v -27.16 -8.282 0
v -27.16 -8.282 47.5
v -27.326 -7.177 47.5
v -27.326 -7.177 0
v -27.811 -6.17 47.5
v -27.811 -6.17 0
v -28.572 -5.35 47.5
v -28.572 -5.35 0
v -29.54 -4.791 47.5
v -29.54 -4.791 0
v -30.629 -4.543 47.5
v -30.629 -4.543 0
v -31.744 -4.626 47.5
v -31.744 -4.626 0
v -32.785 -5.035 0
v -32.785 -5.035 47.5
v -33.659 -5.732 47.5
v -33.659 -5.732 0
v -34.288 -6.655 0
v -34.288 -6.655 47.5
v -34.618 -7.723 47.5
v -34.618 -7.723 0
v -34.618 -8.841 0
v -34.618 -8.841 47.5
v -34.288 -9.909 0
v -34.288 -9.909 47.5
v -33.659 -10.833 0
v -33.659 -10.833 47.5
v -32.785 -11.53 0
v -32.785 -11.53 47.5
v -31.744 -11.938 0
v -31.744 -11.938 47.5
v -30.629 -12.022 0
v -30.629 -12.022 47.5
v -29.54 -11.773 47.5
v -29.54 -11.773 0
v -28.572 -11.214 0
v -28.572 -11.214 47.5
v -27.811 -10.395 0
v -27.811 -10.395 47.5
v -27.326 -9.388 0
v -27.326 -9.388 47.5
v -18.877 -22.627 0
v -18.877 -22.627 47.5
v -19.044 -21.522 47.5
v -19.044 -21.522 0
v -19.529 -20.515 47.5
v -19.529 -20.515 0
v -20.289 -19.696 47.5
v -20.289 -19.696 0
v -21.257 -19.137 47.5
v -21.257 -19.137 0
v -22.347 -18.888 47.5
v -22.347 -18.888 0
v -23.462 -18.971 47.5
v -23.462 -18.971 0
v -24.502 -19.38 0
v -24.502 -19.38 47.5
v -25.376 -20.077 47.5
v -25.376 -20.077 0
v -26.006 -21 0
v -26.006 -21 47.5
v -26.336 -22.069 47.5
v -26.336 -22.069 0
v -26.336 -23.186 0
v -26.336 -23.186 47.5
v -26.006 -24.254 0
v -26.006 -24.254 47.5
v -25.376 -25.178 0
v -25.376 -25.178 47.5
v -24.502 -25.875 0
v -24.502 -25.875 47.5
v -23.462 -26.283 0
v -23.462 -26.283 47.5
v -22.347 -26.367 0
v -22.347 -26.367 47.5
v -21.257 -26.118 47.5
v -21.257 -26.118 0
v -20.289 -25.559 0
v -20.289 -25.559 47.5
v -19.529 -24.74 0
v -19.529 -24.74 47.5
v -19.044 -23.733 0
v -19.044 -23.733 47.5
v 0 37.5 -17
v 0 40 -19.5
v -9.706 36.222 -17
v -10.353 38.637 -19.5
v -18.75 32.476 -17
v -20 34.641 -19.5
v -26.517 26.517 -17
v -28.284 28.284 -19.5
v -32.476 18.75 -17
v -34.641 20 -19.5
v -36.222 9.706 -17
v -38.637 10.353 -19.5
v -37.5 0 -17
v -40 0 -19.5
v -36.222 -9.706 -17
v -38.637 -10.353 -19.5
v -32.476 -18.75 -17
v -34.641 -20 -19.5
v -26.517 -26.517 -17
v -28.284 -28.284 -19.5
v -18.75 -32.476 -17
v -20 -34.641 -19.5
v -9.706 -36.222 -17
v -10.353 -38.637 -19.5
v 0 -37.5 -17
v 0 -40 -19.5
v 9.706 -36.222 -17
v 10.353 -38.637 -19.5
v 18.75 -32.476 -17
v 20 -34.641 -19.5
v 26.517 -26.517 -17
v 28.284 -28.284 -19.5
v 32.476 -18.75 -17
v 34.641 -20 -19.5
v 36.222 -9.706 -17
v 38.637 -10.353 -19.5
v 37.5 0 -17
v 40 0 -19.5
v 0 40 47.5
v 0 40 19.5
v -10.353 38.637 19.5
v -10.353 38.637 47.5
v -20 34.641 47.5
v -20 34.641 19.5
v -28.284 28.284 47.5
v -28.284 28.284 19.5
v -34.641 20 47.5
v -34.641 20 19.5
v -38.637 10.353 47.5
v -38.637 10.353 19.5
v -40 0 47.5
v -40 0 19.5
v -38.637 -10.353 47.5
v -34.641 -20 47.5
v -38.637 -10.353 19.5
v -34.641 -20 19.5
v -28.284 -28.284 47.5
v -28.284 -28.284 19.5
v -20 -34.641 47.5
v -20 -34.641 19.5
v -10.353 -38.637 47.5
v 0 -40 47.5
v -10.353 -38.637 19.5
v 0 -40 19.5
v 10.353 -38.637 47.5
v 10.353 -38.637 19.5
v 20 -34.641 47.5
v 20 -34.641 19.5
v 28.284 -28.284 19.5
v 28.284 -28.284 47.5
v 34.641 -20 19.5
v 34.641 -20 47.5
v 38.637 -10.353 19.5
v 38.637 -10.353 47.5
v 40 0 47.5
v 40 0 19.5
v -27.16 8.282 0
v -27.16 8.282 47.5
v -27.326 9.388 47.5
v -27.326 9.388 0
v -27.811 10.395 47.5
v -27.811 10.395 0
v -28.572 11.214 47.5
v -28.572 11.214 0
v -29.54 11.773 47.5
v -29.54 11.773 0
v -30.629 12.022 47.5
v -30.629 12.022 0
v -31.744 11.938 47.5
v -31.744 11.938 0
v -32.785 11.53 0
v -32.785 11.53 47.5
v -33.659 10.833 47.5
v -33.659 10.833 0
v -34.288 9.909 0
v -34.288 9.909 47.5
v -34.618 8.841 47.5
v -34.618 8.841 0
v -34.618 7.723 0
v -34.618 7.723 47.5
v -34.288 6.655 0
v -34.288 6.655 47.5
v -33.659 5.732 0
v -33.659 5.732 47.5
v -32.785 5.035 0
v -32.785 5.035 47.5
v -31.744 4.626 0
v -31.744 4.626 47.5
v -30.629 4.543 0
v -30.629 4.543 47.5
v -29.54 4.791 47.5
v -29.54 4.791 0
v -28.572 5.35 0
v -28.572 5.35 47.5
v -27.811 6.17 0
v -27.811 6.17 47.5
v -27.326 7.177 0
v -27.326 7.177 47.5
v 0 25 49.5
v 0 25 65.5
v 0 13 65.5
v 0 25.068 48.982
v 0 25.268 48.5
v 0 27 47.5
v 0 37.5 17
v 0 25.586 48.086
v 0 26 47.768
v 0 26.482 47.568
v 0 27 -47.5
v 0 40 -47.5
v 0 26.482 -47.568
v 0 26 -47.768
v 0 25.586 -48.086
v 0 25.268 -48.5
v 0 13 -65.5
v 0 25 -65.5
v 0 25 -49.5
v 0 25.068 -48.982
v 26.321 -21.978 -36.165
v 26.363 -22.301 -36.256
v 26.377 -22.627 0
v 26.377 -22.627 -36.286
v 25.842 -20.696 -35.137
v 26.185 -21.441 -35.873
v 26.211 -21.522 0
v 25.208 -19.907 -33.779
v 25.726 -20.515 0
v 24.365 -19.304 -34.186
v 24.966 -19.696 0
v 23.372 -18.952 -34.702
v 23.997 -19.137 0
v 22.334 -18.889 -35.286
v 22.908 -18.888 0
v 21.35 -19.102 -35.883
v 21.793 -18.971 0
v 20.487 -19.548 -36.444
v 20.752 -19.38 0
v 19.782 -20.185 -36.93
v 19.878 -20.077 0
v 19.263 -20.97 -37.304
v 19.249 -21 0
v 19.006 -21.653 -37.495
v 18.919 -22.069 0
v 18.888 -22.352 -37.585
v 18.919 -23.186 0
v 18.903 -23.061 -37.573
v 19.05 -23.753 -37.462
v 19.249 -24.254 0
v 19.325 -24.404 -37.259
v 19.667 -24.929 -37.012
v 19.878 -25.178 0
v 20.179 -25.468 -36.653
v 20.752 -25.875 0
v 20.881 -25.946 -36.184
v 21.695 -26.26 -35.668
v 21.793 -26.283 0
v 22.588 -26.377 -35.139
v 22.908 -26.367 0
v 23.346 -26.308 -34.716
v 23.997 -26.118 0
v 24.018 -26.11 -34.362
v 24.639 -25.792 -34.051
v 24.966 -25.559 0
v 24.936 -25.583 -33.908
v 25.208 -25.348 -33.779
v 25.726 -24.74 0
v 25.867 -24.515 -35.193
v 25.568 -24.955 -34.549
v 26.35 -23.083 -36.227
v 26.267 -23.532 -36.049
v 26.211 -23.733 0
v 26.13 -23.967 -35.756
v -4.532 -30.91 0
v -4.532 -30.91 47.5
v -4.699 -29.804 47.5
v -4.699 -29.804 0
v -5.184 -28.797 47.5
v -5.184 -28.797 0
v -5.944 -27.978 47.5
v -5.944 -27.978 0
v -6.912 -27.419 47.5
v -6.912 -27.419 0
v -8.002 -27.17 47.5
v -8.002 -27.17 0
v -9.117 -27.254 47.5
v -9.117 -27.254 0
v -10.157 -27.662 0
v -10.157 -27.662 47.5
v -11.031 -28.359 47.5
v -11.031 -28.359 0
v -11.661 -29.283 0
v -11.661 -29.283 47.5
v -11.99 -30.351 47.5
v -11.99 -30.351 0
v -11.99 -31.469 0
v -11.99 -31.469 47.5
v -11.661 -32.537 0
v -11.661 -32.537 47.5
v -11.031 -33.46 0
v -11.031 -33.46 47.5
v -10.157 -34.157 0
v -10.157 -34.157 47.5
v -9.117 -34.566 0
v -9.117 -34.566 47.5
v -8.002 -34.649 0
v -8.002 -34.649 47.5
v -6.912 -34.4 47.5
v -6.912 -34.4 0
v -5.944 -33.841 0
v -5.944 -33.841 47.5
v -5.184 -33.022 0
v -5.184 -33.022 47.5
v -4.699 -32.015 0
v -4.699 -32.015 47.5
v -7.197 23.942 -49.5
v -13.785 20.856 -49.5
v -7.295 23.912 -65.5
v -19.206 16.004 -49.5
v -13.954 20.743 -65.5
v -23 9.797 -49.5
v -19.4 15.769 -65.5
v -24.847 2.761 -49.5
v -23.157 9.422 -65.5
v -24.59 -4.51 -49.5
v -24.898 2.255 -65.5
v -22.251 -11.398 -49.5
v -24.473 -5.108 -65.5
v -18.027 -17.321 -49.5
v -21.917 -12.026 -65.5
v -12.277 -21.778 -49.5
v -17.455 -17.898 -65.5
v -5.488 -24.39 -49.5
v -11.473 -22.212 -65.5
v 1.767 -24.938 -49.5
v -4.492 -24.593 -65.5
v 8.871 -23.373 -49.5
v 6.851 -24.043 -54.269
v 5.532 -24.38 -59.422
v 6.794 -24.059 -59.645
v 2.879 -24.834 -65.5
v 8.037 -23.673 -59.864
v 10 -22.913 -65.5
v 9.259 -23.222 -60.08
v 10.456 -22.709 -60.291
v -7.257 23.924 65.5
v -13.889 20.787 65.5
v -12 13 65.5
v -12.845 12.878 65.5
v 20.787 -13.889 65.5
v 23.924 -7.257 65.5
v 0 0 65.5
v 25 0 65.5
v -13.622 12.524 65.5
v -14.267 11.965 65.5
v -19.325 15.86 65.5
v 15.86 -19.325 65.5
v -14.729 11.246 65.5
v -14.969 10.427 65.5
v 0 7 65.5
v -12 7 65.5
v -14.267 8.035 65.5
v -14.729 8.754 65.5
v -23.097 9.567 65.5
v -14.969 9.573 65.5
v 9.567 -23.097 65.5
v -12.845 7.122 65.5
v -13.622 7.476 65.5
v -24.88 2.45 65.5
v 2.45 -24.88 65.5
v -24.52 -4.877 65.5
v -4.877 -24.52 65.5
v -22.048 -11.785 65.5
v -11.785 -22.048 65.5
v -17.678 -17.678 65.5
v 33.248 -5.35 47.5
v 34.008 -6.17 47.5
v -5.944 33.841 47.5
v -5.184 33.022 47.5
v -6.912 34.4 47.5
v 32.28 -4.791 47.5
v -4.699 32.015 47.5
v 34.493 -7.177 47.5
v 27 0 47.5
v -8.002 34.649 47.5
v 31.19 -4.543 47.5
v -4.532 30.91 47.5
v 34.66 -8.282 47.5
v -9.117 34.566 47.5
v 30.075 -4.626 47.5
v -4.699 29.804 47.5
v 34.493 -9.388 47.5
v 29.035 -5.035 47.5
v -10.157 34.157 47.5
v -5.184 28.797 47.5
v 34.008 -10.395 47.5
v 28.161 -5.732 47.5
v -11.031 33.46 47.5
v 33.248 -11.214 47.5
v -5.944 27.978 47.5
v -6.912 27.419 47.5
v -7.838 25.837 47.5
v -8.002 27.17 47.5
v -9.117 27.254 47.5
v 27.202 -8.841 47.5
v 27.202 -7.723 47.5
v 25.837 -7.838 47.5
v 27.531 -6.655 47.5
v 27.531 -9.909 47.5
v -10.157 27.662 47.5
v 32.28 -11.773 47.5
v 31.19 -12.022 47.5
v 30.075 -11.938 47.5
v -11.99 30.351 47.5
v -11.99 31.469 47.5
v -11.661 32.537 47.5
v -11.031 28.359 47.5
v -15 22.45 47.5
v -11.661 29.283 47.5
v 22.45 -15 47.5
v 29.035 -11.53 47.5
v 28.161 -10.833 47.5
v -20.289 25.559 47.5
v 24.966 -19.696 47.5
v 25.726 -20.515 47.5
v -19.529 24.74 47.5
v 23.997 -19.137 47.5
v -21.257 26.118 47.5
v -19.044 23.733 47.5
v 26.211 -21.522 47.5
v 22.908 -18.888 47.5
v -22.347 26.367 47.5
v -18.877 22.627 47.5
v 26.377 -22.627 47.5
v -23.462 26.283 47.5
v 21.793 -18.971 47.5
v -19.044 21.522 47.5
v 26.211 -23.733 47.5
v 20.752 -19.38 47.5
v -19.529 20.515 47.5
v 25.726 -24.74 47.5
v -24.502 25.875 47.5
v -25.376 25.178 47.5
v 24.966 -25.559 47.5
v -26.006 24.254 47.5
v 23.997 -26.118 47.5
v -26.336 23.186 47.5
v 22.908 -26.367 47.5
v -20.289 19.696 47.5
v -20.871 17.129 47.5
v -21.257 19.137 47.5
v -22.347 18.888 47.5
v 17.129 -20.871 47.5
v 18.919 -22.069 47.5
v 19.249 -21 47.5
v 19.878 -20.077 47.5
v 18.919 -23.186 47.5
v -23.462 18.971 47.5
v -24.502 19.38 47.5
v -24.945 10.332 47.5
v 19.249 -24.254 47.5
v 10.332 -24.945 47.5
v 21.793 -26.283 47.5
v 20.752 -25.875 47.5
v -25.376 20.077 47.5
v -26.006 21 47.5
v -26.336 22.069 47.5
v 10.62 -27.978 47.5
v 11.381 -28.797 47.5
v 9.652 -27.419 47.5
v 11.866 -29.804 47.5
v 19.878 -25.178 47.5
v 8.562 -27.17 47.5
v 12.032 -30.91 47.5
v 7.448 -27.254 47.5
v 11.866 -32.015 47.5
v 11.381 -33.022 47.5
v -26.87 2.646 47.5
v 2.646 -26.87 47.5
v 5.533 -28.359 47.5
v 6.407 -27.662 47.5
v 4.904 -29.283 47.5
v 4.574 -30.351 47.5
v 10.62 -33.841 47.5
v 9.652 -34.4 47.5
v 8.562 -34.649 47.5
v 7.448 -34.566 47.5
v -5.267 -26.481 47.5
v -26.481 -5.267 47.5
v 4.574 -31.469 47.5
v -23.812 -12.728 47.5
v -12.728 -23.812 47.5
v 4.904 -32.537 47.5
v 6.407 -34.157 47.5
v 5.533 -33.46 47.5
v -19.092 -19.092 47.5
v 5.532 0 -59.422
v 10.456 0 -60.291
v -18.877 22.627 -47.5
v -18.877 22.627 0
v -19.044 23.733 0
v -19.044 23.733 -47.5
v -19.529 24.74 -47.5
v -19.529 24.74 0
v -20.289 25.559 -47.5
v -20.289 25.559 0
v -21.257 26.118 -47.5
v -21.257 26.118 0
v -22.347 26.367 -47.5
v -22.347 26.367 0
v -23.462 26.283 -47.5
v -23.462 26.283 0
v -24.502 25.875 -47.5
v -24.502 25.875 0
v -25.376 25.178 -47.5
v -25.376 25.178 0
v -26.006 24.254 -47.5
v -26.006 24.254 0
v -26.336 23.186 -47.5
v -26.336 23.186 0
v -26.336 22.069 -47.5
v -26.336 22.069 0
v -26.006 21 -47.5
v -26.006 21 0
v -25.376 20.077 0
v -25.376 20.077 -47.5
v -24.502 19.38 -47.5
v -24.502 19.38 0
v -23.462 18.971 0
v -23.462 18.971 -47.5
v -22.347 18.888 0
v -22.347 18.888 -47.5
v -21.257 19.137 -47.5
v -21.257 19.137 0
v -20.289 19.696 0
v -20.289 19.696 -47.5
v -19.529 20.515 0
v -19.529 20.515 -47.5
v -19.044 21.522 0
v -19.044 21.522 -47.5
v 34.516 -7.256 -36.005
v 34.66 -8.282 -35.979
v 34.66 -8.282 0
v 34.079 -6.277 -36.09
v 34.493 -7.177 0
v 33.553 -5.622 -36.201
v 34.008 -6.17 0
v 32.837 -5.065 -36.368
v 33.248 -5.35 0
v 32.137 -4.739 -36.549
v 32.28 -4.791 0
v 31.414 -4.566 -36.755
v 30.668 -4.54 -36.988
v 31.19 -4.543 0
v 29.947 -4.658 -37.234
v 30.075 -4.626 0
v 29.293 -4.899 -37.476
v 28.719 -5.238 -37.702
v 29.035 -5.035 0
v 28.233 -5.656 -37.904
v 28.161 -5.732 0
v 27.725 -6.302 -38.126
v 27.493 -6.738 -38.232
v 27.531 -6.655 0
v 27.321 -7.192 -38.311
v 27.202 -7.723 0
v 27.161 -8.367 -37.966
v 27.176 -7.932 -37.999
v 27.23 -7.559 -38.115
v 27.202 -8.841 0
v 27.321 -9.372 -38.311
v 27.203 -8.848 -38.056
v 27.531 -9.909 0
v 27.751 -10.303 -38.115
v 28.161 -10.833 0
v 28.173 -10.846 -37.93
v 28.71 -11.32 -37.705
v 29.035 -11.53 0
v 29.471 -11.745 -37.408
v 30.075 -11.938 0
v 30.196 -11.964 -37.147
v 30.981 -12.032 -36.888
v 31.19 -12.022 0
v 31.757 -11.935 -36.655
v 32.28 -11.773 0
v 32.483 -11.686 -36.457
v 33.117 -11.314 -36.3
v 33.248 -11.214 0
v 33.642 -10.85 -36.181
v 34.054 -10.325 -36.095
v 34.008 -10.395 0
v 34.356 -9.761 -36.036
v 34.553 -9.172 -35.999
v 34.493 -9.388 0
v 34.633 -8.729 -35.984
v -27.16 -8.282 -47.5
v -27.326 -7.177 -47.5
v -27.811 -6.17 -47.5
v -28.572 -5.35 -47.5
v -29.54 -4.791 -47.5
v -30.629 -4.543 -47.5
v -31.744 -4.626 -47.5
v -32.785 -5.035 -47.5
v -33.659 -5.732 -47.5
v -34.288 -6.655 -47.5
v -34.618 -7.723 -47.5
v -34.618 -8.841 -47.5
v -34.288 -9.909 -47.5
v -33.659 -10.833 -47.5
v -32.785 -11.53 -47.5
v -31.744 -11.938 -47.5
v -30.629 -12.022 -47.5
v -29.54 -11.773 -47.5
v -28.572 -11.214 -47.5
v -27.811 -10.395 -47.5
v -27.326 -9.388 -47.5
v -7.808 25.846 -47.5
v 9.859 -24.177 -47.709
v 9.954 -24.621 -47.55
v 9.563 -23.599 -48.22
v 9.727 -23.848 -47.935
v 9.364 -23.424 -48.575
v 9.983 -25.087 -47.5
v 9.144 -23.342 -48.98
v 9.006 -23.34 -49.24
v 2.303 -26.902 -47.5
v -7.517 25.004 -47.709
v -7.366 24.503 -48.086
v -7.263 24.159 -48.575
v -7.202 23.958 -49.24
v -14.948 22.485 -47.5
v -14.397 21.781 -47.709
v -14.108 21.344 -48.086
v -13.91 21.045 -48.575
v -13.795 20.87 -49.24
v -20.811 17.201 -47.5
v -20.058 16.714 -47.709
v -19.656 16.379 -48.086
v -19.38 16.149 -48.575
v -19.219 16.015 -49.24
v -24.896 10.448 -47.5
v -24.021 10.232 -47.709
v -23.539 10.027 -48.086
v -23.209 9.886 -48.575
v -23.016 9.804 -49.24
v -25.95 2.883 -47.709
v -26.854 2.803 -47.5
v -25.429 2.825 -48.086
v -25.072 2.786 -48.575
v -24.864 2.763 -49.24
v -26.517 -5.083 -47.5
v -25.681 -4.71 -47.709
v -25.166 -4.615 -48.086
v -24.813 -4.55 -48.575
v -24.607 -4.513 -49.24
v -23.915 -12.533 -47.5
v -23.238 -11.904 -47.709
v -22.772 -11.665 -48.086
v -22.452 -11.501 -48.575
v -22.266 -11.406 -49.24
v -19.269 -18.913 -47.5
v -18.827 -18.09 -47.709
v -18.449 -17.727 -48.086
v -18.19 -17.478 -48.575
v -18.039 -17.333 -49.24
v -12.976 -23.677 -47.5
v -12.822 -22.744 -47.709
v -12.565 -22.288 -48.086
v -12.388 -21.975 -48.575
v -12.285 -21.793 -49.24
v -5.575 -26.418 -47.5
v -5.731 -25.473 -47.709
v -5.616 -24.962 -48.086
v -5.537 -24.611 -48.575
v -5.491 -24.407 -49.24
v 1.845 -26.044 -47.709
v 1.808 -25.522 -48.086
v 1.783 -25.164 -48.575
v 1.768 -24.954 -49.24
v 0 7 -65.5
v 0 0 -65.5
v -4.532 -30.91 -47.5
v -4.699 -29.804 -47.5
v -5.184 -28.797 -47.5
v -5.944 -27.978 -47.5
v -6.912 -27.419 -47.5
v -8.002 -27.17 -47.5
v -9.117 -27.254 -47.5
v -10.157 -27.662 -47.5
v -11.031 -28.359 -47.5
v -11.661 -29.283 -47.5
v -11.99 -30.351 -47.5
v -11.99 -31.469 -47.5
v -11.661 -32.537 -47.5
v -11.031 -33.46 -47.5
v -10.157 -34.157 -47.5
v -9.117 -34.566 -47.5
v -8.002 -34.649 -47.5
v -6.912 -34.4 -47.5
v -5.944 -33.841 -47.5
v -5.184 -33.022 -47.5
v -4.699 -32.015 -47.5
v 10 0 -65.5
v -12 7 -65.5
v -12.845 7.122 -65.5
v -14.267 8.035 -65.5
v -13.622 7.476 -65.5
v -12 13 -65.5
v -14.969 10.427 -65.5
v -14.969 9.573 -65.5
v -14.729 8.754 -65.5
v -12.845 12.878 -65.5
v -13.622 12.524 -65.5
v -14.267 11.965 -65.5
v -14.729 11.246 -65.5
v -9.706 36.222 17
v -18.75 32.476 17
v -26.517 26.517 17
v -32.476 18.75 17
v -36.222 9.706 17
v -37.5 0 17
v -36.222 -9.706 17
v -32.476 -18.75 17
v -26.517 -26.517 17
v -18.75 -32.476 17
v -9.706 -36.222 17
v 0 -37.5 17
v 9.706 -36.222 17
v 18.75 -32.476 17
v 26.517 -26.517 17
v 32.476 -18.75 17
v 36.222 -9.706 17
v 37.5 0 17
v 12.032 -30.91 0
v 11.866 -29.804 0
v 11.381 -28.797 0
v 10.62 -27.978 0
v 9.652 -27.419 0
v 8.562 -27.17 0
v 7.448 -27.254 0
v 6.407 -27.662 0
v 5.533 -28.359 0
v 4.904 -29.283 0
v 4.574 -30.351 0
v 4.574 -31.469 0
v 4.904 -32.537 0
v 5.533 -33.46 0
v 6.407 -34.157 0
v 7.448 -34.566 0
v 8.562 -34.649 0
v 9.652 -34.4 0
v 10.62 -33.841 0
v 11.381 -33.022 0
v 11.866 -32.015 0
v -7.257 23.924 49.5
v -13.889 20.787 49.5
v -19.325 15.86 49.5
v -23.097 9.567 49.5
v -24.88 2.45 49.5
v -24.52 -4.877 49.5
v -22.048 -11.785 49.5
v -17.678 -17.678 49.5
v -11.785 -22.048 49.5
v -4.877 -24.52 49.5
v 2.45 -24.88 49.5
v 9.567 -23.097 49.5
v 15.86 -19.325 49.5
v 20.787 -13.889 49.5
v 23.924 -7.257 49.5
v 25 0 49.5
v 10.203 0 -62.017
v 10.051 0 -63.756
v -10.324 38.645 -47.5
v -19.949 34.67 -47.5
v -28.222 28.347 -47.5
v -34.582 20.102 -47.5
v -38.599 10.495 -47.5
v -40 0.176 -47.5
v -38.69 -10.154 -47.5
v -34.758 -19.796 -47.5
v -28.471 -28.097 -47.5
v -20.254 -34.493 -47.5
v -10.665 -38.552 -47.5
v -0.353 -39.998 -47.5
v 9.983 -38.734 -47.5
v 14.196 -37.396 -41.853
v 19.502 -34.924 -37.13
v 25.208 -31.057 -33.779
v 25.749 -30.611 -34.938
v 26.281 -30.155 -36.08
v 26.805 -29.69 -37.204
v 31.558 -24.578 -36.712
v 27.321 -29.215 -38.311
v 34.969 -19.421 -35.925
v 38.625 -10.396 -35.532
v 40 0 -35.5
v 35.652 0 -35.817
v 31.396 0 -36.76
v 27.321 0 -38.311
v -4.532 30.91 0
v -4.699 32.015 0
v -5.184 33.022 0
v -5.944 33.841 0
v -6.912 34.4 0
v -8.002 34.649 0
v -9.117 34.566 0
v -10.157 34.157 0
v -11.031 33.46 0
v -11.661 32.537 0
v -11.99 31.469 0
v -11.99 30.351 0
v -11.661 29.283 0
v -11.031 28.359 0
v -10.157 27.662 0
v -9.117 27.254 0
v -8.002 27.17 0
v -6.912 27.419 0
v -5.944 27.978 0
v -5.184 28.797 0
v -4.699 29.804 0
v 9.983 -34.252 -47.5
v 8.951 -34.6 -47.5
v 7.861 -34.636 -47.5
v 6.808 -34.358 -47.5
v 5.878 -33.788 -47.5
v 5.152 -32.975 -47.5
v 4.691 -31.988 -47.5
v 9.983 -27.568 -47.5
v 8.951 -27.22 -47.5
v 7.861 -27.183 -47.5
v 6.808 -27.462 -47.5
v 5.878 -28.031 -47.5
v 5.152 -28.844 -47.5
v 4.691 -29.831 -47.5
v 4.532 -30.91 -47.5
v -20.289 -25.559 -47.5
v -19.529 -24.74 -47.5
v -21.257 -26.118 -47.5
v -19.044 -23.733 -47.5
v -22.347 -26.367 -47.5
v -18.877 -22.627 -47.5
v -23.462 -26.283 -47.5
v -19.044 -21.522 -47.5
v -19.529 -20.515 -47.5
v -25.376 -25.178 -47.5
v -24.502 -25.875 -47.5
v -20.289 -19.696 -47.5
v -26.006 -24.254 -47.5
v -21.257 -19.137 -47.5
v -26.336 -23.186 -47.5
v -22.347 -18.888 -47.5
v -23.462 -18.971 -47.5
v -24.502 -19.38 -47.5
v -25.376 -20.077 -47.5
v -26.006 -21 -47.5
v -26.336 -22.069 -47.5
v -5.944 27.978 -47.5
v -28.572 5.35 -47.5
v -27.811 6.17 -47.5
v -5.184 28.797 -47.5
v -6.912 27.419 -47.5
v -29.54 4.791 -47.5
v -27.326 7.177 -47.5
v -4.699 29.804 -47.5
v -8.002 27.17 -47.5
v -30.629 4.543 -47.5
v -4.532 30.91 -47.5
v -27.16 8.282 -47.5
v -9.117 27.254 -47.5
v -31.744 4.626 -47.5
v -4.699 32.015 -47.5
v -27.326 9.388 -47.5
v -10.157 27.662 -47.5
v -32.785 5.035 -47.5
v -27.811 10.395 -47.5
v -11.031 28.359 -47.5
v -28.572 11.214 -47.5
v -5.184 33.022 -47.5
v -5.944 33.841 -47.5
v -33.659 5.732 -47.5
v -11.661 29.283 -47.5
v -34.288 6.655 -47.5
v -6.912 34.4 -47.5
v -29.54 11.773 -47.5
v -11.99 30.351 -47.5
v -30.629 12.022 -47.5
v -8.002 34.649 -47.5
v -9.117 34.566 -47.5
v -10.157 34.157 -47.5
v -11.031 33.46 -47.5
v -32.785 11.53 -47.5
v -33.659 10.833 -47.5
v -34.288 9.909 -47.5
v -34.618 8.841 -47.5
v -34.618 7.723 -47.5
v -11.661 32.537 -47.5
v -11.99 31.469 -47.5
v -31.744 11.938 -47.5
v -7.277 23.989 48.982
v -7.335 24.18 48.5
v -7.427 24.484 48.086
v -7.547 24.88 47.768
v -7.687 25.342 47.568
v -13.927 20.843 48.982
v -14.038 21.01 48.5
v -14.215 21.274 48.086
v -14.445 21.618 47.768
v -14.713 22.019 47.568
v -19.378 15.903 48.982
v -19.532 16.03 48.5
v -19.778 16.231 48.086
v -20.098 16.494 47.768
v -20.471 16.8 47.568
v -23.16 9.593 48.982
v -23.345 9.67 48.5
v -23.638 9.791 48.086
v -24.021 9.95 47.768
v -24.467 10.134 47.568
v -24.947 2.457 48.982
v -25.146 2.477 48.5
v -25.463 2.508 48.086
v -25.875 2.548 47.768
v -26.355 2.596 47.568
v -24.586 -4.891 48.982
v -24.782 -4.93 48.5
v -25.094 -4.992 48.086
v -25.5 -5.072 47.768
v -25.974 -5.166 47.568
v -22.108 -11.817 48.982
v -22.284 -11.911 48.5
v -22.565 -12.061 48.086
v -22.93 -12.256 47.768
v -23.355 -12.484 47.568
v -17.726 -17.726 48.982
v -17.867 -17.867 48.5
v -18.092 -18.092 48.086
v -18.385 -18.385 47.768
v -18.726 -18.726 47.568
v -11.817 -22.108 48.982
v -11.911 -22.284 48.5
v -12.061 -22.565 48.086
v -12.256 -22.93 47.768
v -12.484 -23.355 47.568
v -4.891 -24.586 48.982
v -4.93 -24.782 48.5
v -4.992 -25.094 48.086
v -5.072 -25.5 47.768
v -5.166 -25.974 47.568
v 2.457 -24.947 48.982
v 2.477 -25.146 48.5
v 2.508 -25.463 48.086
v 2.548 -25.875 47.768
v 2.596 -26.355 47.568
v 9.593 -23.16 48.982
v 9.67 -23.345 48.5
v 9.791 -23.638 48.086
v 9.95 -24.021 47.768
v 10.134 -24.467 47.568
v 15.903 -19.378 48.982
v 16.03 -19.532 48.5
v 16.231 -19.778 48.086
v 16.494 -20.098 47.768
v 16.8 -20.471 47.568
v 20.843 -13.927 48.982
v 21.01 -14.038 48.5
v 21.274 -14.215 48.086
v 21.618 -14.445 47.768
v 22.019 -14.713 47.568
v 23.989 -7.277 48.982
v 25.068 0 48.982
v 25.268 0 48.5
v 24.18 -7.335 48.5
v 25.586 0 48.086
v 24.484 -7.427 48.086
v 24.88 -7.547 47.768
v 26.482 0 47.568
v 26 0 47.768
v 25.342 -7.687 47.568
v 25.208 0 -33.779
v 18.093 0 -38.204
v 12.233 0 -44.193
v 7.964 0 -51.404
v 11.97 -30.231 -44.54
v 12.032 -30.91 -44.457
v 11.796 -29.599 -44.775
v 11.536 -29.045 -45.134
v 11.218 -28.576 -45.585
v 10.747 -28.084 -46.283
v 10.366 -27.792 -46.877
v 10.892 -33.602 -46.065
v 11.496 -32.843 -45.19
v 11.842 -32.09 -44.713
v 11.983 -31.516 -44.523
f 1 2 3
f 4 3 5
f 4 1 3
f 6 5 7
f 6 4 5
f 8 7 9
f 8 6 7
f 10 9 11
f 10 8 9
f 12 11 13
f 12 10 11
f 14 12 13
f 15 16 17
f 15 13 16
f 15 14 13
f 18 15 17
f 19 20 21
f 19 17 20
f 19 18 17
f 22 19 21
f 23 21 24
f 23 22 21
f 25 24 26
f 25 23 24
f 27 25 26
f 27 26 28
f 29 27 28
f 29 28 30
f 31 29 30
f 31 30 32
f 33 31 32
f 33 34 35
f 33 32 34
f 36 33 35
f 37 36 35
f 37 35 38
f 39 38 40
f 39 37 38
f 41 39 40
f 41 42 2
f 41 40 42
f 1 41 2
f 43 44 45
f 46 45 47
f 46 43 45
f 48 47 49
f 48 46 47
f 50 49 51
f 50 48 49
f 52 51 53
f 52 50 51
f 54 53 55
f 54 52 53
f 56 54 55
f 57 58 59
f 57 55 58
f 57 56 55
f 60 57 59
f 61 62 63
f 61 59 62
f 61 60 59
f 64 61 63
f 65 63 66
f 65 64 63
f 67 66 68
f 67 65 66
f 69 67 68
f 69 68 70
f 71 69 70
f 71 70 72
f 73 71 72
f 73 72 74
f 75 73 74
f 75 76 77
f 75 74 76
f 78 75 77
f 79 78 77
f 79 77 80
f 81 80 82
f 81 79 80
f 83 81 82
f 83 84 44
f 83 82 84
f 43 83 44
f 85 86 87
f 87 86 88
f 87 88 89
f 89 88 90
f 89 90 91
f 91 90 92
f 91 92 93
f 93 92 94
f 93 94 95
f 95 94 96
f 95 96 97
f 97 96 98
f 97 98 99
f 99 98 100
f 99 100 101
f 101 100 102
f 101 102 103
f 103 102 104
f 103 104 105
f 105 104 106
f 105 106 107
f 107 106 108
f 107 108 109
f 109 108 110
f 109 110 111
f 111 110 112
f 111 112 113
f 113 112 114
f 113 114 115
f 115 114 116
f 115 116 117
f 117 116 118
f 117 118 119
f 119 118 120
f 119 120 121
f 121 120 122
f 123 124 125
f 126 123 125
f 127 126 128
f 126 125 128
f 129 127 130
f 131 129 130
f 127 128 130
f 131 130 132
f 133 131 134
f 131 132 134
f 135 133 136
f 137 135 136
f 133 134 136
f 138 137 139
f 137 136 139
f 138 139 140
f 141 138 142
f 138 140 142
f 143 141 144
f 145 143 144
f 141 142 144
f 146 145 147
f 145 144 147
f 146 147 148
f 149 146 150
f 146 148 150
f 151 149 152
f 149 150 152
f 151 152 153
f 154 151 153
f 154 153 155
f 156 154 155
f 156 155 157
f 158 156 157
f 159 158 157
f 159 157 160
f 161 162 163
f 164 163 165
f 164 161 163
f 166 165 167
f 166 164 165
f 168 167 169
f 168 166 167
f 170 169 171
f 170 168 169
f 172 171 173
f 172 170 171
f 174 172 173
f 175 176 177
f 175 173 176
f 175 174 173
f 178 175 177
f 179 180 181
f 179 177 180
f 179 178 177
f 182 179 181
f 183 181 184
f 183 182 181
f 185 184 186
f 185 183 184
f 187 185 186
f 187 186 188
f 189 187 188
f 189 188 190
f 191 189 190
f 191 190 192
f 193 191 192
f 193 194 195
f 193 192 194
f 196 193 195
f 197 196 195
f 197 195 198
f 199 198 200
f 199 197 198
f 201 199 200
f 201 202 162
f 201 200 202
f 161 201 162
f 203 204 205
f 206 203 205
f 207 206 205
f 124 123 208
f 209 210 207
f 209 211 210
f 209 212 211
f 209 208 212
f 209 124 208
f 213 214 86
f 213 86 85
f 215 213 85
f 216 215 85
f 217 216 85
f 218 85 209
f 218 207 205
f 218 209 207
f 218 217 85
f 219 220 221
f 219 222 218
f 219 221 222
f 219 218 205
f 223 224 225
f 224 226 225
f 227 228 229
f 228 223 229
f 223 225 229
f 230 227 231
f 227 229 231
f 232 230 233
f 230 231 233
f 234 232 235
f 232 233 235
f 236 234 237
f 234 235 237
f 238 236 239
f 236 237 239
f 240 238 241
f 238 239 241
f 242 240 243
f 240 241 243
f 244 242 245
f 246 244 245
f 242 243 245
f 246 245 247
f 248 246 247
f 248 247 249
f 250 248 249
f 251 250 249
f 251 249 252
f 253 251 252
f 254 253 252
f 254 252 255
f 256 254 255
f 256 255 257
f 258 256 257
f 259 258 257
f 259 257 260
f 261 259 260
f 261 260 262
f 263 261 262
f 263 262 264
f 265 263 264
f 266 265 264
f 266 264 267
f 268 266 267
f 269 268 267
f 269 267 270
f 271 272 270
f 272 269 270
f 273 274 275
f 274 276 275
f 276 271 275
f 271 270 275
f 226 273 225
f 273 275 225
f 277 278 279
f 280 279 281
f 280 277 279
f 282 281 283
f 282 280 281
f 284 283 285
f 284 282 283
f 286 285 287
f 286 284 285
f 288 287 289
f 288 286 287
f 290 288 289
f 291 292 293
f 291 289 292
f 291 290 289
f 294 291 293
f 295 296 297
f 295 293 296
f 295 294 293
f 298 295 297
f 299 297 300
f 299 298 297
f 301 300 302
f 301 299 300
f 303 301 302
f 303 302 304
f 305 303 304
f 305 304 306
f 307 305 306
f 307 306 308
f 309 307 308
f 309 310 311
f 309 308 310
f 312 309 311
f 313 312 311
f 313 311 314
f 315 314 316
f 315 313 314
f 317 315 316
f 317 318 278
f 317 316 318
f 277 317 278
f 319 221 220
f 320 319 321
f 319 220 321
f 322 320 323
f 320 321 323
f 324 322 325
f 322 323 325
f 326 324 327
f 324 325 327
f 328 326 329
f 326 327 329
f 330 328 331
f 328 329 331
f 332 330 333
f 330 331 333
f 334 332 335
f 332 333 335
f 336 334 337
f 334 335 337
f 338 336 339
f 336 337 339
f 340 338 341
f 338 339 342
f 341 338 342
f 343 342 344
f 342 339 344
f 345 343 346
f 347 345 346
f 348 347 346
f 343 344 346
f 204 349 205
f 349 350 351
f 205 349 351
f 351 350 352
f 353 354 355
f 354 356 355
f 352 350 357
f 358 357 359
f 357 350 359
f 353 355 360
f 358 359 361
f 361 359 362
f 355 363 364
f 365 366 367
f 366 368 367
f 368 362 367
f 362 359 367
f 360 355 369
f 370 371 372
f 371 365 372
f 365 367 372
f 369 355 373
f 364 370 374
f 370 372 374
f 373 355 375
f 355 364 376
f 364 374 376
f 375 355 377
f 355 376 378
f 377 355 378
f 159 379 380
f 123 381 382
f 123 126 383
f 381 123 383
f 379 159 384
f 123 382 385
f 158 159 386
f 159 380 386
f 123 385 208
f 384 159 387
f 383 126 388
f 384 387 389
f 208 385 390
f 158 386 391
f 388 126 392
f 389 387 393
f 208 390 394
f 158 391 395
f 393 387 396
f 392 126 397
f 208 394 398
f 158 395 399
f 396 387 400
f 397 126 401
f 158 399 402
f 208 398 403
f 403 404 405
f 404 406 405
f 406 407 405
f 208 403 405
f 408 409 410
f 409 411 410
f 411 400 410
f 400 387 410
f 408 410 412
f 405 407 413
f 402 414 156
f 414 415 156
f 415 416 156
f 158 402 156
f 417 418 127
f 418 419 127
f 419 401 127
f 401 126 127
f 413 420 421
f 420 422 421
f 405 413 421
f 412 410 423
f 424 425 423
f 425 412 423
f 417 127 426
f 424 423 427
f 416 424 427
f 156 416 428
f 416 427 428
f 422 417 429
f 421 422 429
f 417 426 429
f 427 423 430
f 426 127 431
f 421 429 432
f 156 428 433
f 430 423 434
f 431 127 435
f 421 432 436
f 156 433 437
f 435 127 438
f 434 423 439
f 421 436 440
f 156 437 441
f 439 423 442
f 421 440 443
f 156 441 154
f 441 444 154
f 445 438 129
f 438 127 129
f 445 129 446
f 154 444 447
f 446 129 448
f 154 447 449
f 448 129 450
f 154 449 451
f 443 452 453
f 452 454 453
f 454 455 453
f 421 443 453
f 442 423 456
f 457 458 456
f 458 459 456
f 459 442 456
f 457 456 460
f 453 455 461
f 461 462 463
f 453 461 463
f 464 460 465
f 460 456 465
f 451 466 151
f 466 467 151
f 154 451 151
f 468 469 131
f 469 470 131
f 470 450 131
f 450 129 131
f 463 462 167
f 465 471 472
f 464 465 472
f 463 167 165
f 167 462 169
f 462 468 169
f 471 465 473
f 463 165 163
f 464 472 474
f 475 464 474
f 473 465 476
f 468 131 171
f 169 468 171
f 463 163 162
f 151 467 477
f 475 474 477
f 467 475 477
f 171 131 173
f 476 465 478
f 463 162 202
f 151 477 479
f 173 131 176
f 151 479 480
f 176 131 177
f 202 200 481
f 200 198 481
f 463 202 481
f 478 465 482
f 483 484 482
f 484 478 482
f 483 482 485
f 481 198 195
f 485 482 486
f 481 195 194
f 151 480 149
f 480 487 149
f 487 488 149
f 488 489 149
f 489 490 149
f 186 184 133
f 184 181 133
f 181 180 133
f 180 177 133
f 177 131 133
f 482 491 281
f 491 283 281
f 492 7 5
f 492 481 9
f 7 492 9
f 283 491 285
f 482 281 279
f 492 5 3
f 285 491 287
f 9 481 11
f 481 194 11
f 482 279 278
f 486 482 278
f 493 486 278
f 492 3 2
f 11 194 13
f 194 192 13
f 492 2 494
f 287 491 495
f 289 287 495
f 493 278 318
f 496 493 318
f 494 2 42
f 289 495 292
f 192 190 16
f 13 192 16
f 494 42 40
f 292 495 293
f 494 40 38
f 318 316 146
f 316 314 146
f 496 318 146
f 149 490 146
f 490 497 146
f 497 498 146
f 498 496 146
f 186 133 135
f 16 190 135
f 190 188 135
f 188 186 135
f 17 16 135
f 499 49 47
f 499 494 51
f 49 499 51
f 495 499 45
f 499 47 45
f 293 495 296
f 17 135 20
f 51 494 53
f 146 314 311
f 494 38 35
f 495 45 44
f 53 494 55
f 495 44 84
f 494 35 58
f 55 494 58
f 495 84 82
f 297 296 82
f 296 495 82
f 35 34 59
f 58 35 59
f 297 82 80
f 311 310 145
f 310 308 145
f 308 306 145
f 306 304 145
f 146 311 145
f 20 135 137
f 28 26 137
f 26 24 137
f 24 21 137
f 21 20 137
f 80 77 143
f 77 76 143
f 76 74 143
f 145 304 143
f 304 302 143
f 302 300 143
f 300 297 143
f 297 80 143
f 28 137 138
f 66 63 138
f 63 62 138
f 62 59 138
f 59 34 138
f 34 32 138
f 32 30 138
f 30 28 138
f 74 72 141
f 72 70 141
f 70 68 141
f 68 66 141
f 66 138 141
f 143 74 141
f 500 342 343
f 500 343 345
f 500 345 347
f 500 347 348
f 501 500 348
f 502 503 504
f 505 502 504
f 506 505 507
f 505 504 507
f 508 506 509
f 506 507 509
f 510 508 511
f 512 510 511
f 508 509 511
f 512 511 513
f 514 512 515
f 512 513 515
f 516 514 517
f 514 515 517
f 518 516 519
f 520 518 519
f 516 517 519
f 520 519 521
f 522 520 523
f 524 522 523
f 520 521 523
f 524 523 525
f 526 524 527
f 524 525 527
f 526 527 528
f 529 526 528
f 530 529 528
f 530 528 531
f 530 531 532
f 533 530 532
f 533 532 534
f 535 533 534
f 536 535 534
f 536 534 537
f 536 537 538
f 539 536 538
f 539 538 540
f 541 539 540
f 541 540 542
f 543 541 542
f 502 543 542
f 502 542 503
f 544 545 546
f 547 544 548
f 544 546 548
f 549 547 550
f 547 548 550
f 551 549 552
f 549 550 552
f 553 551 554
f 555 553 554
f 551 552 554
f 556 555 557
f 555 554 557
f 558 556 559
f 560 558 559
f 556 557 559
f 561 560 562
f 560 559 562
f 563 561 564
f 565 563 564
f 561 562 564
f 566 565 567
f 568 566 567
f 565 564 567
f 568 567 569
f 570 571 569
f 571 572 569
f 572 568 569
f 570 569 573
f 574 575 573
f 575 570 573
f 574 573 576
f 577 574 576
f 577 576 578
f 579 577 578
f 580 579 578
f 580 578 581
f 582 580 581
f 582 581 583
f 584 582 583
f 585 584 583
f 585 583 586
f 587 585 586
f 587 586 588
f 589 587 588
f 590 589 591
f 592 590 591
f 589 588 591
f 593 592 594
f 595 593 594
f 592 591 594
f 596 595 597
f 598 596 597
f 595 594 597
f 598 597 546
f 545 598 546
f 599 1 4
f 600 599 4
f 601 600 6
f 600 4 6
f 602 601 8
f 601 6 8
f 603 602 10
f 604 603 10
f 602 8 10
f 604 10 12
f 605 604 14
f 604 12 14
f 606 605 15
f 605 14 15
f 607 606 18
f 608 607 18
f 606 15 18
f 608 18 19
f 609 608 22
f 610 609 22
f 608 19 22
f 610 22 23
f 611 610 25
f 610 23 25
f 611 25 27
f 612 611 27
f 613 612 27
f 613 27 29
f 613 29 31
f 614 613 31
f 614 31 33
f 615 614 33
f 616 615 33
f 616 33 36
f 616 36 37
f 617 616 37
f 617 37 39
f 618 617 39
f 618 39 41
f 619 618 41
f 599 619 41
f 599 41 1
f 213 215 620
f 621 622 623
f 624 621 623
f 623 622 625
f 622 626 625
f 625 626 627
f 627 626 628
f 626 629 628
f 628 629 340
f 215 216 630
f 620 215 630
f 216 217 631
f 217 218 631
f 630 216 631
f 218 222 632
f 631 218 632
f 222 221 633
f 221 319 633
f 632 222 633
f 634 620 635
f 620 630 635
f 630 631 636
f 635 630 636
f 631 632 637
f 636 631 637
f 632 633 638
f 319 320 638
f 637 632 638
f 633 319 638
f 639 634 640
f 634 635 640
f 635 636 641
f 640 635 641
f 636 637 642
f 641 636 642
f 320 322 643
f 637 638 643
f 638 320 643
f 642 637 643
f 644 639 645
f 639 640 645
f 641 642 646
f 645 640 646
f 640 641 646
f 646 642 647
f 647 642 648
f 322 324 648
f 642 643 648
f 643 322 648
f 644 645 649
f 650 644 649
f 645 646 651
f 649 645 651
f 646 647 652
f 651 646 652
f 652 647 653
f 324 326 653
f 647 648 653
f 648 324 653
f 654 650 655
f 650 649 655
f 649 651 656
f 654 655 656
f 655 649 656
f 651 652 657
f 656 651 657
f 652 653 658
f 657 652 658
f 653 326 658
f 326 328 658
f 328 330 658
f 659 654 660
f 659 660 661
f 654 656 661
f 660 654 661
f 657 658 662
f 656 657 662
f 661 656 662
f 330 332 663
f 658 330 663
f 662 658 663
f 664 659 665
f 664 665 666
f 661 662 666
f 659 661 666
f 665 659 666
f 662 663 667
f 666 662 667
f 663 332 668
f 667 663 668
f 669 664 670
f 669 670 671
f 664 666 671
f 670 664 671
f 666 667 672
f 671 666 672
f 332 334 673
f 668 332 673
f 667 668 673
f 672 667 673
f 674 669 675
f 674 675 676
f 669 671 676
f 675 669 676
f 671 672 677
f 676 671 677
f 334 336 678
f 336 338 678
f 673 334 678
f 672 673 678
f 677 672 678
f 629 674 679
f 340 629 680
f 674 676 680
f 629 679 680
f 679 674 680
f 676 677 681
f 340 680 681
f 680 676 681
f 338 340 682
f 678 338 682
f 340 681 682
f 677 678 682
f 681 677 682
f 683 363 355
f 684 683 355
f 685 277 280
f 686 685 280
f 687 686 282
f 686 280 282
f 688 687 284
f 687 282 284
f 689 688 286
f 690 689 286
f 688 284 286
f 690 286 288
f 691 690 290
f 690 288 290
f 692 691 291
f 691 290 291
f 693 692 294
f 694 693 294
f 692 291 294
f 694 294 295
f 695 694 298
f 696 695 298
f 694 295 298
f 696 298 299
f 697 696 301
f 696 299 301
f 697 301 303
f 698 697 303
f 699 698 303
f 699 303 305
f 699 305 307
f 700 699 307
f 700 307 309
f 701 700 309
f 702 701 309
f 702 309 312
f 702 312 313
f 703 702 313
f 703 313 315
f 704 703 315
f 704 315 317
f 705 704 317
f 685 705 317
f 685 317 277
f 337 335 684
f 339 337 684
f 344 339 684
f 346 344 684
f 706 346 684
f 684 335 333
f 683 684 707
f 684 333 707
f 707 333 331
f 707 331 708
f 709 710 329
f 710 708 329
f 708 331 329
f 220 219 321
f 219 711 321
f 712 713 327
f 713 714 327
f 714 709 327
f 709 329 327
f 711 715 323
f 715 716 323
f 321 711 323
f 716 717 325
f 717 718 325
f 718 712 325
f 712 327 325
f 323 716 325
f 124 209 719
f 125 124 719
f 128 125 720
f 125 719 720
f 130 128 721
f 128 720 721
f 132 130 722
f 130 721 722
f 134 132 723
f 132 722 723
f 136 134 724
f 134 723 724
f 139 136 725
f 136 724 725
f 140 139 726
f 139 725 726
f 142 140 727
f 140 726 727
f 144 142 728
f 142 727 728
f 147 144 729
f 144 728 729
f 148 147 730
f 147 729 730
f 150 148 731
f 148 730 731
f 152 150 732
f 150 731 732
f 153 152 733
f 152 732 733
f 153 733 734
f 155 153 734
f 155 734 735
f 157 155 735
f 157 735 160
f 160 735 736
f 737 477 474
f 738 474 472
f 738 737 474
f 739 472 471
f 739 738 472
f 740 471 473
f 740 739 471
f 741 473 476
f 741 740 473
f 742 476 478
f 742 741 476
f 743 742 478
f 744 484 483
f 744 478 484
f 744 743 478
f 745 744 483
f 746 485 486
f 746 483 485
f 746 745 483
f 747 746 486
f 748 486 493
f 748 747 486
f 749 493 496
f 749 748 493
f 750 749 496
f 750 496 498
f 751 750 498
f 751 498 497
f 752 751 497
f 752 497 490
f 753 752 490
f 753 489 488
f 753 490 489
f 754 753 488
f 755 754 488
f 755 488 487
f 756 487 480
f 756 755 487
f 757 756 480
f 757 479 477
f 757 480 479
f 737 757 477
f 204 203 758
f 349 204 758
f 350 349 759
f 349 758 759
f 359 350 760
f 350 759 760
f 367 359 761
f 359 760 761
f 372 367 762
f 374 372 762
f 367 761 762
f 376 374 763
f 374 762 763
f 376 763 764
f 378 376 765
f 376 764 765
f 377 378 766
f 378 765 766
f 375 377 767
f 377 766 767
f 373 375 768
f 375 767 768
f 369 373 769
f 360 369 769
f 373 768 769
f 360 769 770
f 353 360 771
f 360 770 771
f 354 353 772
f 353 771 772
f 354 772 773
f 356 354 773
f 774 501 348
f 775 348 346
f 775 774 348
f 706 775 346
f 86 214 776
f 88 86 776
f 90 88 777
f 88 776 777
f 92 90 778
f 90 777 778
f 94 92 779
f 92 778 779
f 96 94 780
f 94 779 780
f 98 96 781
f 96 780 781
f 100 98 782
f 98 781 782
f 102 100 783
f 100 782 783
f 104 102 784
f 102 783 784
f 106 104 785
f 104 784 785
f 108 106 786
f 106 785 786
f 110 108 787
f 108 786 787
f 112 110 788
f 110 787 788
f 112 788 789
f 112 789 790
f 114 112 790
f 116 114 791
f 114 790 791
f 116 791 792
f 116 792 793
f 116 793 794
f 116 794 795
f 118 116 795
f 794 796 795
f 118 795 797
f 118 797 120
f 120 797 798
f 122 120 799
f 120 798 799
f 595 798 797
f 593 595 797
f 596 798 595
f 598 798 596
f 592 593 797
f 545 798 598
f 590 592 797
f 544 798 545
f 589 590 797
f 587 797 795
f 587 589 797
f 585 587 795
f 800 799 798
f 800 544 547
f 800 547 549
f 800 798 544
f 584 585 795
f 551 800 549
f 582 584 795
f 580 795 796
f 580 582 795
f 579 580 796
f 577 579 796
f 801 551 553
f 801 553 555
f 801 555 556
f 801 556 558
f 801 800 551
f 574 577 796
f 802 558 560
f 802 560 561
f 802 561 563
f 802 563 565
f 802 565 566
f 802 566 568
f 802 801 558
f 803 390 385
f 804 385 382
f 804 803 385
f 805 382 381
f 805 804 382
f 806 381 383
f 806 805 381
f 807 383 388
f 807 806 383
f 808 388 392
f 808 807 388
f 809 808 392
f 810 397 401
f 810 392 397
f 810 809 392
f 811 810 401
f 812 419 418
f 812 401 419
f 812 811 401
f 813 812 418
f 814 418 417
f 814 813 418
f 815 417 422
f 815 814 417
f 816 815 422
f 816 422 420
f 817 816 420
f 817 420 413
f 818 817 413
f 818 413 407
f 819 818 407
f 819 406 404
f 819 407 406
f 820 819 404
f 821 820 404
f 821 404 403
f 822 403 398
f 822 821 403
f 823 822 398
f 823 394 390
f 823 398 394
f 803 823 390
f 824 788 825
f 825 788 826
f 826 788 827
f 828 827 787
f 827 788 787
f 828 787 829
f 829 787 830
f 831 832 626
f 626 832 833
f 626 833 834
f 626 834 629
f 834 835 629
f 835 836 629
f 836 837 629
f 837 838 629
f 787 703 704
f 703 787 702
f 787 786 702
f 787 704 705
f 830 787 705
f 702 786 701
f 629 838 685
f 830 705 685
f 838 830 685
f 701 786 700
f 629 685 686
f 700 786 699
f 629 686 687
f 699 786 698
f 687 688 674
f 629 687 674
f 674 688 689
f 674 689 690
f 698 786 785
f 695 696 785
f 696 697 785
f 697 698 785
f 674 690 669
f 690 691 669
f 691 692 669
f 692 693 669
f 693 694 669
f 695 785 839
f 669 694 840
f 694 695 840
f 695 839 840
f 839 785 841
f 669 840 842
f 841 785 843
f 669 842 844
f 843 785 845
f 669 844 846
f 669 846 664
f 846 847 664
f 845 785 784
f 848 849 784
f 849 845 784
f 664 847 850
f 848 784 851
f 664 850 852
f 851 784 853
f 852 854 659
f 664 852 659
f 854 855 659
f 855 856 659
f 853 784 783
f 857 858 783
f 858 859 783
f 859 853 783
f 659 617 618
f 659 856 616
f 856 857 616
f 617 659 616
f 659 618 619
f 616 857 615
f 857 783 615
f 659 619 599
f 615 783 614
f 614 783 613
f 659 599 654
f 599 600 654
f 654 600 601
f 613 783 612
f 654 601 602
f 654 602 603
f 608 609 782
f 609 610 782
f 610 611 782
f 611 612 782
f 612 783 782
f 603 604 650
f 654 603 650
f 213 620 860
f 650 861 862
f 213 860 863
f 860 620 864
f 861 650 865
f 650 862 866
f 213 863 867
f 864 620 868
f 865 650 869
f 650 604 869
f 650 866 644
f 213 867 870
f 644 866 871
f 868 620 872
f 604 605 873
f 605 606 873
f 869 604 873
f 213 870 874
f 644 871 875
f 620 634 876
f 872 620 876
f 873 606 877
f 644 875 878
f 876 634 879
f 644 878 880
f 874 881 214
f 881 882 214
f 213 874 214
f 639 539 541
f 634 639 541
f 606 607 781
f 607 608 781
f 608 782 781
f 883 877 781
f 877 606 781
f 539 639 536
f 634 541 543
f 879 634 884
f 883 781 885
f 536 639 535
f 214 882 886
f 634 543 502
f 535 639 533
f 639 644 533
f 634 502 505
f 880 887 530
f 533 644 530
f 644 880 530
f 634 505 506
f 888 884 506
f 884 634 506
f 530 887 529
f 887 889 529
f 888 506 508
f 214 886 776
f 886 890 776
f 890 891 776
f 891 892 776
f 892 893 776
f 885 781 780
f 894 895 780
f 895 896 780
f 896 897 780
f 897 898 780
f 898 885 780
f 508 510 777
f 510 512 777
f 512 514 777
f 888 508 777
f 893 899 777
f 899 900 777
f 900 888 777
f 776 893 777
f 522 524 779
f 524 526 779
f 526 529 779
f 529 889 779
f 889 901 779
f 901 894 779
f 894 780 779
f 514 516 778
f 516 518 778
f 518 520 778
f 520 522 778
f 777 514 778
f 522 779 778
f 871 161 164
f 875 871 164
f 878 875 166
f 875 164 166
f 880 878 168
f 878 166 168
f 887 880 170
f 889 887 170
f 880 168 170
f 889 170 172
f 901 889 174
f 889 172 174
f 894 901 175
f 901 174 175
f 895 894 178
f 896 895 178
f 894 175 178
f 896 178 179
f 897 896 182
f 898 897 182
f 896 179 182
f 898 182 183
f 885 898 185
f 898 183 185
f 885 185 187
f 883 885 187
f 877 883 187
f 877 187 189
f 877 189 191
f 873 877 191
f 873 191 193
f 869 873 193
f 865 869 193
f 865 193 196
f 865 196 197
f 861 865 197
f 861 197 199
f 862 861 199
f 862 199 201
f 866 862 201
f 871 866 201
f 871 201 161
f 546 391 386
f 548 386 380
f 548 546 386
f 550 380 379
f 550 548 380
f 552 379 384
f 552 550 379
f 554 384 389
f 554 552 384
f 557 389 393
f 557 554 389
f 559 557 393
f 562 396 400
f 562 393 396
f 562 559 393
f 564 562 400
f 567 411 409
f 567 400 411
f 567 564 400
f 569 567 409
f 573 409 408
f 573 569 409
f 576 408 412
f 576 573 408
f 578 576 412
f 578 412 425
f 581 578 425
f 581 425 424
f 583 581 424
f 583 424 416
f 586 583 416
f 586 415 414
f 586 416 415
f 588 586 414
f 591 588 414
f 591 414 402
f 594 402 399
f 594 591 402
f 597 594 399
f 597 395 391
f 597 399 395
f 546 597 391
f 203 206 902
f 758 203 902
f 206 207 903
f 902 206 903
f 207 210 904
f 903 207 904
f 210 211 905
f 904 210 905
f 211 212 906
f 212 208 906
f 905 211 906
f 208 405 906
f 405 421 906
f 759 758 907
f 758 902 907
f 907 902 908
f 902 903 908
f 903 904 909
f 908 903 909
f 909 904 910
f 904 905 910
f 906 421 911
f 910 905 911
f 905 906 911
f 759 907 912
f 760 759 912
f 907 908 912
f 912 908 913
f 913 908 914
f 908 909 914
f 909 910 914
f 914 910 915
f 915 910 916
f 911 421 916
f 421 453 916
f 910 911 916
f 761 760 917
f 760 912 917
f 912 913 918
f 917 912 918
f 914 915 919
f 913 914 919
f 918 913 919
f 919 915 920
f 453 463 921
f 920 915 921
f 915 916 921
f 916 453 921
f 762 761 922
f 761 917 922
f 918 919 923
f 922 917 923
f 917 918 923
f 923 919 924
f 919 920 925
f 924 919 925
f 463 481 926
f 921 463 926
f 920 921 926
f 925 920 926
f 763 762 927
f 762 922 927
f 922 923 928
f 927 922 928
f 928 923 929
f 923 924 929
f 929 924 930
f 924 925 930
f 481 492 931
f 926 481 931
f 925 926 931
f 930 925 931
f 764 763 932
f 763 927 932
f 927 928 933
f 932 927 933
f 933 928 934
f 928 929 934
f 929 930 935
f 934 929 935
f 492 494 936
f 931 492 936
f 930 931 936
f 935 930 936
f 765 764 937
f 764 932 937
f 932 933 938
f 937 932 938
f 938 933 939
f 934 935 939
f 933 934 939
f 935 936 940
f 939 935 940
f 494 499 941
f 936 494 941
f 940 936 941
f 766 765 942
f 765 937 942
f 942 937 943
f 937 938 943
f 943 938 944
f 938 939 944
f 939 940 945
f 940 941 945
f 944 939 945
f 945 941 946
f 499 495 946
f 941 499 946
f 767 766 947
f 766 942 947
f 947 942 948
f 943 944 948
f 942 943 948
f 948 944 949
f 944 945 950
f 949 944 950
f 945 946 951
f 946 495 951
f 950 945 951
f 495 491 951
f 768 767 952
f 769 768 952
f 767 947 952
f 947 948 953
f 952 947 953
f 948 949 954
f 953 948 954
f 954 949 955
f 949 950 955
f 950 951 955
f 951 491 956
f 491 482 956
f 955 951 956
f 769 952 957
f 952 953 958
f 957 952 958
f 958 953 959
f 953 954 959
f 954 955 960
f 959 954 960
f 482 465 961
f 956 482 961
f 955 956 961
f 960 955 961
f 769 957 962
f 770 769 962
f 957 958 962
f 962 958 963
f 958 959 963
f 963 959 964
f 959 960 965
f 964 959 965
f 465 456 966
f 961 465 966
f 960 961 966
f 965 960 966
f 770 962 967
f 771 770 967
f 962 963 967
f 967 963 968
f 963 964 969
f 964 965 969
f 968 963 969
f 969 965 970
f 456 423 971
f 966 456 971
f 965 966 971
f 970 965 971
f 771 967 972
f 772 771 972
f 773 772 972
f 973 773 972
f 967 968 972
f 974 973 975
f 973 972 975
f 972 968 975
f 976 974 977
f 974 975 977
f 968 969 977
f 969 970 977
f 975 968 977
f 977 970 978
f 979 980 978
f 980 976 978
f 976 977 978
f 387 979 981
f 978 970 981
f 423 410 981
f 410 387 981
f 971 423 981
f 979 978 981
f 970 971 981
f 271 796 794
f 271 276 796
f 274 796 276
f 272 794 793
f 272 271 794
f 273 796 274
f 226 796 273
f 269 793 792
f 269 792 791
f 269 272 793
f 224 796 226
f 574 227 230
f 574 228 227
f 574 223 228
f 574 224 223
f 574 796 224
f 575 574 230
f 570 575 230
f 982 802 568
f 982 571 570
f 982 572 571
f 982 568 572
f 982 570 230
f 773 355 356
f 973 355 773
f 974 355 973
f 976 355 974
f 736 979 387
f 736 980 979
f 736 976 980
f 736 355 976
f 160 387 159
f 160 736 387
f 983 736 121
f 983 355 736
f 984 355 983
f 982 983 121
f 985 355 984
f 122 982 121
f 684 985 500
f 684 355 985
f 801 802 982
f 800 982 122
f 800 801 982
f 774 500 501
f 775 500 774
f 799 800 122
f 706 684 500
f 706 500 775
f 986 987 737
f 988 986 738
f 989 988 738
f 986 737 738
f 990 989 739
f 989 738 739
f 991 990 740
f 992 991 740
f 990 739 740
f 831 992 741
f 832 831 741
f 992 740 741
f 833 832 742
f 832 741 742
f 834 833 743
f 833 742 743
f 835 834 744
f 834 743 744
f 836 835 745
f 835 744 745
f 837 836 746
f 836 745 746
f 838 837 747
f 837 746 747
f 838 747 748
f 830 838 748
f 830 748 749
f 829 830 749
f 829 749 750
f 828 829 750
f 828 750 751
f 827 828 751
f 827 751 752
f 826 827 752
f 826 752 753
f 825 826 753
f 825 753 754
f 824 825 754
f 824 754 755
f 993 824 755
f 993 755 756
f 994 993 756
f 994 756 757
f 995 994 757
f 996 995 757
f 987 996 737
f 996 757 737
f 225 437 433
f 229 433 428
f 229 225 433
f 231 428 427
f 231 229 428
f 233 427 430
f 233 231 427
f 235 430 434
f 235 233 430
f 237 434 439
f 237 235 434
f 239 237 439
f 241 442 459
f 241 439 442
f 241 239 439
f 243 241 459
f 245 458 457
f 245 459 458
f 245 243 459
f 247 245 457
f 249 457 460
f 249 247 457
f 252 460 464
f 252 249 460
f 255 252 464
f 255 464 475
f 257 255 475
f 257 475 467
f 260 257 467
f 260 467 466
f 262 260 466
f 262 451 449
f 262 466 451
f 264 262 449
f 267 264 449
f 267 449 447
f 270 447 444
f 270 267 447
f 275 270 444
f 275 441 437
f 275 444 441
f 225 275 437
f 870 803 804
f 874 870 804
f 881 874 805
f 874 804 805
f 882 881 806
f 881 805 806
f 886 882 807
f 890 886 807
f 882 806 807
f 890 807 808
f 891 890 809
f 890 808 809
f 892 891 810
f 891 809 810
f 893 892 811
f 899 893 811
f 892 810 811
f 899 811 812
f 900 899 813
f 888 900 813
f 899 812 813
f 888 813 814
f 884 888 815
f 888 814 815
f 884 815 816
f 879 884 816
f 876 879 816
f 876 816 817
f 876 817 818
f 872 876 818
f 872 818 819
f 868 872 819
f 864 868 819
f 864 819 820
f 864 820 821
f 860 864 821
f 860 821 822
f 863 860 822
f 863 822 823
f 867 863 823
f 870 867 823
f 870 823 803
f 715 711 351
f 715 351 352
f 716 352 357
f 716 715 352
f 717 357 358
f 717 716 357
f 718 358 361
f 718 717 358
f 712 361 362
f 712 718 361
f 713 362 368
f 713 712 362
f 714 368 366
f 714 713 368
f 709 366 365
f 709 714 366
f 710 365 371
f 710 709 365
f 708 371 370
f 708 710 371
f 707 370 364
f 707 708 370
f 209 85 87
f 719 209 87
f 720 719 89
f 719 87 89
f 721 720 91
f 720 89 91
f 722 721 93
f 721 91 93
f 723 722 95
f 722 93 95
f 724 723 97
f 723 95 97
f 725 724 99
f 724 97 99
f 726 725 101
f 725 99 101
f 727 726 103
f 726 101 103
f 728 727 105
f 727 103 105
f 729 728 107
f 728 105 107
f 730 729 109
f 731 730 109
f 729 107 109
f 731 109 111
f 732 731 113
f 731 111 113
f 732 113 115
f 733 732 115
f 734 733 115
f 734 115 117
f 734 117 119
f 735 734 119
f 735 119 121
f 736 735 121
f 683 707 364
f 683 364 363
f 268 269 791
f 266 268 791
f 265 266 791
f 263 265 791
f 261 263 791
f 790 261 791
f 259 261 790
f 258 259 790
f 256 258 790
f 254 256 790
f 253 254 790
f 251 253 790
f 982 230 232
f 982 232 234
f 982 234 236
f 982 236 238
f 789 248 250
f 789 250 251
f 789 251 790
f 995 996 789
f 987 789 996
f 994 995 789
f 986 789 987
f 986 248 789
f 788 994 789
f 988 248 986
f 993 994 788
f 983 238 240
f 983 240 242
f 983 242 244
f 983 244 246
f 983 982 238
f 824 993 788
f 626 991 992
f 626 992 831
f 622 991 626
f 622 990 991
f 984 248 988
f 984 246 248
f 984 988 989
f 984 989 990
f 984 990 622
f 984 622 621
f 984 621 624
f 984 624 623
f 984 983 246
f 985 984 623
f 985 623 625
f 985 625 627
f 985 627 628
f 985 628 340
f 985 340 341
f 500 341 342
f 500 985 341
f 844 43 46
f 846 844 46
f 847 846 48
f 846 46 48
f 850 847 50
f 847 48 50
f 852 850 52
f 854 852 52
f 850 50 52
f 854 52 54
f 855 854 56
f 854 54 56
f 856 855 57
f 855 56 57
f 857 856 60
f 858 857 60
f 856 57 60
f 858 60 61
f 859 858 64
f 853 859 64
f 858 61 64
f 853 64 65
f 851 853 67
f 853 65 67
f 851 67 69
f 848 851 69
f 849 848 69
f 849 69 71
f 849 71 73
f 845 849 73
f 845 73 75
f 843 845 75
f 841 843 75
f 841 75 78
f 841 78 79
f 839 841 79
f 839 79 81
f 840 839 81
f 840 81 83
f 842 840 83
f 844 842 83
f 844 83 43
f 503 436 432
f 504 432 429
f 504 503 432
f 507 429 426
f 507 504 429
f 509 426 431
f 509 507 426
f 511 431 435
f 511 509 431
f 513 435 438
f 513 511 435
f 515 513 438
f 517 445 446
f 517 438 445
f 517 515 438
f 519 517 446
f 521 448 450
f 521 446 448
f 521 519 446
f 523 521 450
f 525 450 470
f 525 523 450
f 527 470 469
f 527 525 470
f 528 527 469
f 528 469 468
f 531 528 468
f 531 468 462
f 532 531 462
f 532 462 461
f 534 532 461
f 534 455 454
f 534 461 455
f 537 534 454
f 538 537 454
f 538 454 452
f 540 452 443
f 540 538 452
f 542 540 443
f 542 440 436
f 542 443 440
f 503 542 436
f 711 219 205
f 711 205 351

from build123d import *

# Parameters (mm, degrees)
CUT_EXTRUDE1_DEPTH      = 66.5
CUT_EXTRUDE1_DEPTH_BACK = 66.5
CUT_EXTRUDE3_DEPTH      = 41
SKETCH4_R               = 3.75
CUT_EXTRUDE4_DEPTH      = 66.5000001
CUT_EXTRUDE4_DEPTH_BACK = 66.5000001


with BuildPart() as part:
    # Sketch1 → Revolve1 (revolve)
    with BuildSketch(Plane(origin=(0, 0, 0), x_dir=(0, 0, -1), z_dir=(1, 0, 0))):
        with BuildLine():
            Line((65.5, 0), (-65.5, 0))
            Line((-65.5, 0), (-65.5, 25))
            Line((-65.5, 25), (-49.5, 25))
            ThreePointArc((-49.5, 25), (-48.085786438, 25.585786438), (-47.5, 27))
            Line((-47.5, 27), (-47.5, 40))
            Line((-47.5, 40), (-19.5, 40))
            Line((-19.5, 40), (-17, 37.5))
            Line((-17, 37.5), (17, 37.5))
            Line((17, 37.5), (19.5, 40))
            Line((19.5, 40), (47.5, 40))
            Line((47.5, 40), (47.5, 27))
            ThreePointArc((47.5, 27), (48.085786438, 25.585786438), (49.5, 25))
            Line((49.5, 25), (65.5, 25))
            Line((65.5, 25), (65.5, 0))
        make_face()
    revolve(axis=Axis((0, 0, -65.5), (0, 0, 1)))

    # Sketch2 → Cut-Extrude1 (cut, two sides)
    with BuildSketch(Plane.XY) as cut_extrude1_sk:
        with BuildLine():
            Line((0, 40), (0, 13))
            Line((0, 13), (-12, 13))
            ThreePointArc((-12, 13), (-15, 10), (-12, 7))
            Line((-12, 7), (0, 7))
            Line((0, 7), (0, 0))
            Line((0, 0), (40, 0))
            ThreePointArc((40, 0), (28.284271247, 28.284271247), (0, 40))
        make_face()
    extrude(amount=CUT_EXTRUDE1_DEPTH, mode=Mode.SUBTRACT)
    extrude(cut_extrude1_sk.sketch, amount=-CUT_EXTRUDE1_DEPTH_BACK, mode=Mode.SUBTRACT)

    # Sketch3 → Cut-Extrude3 (cut, through all)
    with BuildSketch(Plane(origin=(0, 0, 0), x_dir=(1, 0, 0), z_dir=(0, 1, 0))):
        with BuildLine():
            Line((27.321452148, 38.310766389), (25.208360839, 33.779227454))
            ThreePointArc((25.208360839, 33.779227454), (12.23263309, 44.193349985), (5.531728645, 59.422313782))
            Line((5.531728645, 59.422313782), (10.45576741, 60.29055467))
            ThreePointArc((10.45576741, 60.29055467), (63.800600209, 83.76284287), (27.321452148, 38.310766389))
        make_face()
    extrude(amount=-CUT_EXTRUDE3_DEPTH, mode=Mode.SUBTRACT)

    # Sketch4 → Cut-Extrude4 (cut, two sides)
    with BuildSketch(Plane.XY) as cut_extrude4_sk:
        with Locations((-8.282209443, 30.909626441)):
            Circle(SKETCH4_R)
        with Locations((8.282209443, 30.909626441)):
            Circle(SKETCH4_R)
        with Locations((22.627416998, 22.627416998)):
            Circle(SKETCH4_R)
        with Locations((30.909626441, 8.282209443)):
            Circle(SKETCH4_R)
        with Locations((30.909626441, -8.282209443)):
            Circle(SKETCH4_R)
        with Locations((22.627416998, -22.627416998)):
            Circle(SKETCH4_R)
        with Locations((8.282209443, -30.909626441)):
            Circle(SKETCH4_R)
        with Locations((-8.282209443, -30.909626441)):
            Circle(SKETCH4_R)
        with Locations((-22.627416998, -22.627416998)):
            Circle(SKETCH4_R)
        with Locations((-30.909626441, -8.282209443)):
            Circle(SKETCH4_R)
        with Locations((-30.909626441, 8.282209443)):
            Circle(SKETCH4_R)
        with Locations((-22.627416998, 22.627416998)):
            Circle(SKETCH4_R)
    extrude(amount=CUT_EXTRUDE4_DEPTH, mode=Mode.SUBTRACT)
    extrude(cut_extrude4_sk.sketch, amount=-CUT_EXTRUDE4_DEPTH_BACK, mode=Mode.SUBTRACT)


solid = part.part
